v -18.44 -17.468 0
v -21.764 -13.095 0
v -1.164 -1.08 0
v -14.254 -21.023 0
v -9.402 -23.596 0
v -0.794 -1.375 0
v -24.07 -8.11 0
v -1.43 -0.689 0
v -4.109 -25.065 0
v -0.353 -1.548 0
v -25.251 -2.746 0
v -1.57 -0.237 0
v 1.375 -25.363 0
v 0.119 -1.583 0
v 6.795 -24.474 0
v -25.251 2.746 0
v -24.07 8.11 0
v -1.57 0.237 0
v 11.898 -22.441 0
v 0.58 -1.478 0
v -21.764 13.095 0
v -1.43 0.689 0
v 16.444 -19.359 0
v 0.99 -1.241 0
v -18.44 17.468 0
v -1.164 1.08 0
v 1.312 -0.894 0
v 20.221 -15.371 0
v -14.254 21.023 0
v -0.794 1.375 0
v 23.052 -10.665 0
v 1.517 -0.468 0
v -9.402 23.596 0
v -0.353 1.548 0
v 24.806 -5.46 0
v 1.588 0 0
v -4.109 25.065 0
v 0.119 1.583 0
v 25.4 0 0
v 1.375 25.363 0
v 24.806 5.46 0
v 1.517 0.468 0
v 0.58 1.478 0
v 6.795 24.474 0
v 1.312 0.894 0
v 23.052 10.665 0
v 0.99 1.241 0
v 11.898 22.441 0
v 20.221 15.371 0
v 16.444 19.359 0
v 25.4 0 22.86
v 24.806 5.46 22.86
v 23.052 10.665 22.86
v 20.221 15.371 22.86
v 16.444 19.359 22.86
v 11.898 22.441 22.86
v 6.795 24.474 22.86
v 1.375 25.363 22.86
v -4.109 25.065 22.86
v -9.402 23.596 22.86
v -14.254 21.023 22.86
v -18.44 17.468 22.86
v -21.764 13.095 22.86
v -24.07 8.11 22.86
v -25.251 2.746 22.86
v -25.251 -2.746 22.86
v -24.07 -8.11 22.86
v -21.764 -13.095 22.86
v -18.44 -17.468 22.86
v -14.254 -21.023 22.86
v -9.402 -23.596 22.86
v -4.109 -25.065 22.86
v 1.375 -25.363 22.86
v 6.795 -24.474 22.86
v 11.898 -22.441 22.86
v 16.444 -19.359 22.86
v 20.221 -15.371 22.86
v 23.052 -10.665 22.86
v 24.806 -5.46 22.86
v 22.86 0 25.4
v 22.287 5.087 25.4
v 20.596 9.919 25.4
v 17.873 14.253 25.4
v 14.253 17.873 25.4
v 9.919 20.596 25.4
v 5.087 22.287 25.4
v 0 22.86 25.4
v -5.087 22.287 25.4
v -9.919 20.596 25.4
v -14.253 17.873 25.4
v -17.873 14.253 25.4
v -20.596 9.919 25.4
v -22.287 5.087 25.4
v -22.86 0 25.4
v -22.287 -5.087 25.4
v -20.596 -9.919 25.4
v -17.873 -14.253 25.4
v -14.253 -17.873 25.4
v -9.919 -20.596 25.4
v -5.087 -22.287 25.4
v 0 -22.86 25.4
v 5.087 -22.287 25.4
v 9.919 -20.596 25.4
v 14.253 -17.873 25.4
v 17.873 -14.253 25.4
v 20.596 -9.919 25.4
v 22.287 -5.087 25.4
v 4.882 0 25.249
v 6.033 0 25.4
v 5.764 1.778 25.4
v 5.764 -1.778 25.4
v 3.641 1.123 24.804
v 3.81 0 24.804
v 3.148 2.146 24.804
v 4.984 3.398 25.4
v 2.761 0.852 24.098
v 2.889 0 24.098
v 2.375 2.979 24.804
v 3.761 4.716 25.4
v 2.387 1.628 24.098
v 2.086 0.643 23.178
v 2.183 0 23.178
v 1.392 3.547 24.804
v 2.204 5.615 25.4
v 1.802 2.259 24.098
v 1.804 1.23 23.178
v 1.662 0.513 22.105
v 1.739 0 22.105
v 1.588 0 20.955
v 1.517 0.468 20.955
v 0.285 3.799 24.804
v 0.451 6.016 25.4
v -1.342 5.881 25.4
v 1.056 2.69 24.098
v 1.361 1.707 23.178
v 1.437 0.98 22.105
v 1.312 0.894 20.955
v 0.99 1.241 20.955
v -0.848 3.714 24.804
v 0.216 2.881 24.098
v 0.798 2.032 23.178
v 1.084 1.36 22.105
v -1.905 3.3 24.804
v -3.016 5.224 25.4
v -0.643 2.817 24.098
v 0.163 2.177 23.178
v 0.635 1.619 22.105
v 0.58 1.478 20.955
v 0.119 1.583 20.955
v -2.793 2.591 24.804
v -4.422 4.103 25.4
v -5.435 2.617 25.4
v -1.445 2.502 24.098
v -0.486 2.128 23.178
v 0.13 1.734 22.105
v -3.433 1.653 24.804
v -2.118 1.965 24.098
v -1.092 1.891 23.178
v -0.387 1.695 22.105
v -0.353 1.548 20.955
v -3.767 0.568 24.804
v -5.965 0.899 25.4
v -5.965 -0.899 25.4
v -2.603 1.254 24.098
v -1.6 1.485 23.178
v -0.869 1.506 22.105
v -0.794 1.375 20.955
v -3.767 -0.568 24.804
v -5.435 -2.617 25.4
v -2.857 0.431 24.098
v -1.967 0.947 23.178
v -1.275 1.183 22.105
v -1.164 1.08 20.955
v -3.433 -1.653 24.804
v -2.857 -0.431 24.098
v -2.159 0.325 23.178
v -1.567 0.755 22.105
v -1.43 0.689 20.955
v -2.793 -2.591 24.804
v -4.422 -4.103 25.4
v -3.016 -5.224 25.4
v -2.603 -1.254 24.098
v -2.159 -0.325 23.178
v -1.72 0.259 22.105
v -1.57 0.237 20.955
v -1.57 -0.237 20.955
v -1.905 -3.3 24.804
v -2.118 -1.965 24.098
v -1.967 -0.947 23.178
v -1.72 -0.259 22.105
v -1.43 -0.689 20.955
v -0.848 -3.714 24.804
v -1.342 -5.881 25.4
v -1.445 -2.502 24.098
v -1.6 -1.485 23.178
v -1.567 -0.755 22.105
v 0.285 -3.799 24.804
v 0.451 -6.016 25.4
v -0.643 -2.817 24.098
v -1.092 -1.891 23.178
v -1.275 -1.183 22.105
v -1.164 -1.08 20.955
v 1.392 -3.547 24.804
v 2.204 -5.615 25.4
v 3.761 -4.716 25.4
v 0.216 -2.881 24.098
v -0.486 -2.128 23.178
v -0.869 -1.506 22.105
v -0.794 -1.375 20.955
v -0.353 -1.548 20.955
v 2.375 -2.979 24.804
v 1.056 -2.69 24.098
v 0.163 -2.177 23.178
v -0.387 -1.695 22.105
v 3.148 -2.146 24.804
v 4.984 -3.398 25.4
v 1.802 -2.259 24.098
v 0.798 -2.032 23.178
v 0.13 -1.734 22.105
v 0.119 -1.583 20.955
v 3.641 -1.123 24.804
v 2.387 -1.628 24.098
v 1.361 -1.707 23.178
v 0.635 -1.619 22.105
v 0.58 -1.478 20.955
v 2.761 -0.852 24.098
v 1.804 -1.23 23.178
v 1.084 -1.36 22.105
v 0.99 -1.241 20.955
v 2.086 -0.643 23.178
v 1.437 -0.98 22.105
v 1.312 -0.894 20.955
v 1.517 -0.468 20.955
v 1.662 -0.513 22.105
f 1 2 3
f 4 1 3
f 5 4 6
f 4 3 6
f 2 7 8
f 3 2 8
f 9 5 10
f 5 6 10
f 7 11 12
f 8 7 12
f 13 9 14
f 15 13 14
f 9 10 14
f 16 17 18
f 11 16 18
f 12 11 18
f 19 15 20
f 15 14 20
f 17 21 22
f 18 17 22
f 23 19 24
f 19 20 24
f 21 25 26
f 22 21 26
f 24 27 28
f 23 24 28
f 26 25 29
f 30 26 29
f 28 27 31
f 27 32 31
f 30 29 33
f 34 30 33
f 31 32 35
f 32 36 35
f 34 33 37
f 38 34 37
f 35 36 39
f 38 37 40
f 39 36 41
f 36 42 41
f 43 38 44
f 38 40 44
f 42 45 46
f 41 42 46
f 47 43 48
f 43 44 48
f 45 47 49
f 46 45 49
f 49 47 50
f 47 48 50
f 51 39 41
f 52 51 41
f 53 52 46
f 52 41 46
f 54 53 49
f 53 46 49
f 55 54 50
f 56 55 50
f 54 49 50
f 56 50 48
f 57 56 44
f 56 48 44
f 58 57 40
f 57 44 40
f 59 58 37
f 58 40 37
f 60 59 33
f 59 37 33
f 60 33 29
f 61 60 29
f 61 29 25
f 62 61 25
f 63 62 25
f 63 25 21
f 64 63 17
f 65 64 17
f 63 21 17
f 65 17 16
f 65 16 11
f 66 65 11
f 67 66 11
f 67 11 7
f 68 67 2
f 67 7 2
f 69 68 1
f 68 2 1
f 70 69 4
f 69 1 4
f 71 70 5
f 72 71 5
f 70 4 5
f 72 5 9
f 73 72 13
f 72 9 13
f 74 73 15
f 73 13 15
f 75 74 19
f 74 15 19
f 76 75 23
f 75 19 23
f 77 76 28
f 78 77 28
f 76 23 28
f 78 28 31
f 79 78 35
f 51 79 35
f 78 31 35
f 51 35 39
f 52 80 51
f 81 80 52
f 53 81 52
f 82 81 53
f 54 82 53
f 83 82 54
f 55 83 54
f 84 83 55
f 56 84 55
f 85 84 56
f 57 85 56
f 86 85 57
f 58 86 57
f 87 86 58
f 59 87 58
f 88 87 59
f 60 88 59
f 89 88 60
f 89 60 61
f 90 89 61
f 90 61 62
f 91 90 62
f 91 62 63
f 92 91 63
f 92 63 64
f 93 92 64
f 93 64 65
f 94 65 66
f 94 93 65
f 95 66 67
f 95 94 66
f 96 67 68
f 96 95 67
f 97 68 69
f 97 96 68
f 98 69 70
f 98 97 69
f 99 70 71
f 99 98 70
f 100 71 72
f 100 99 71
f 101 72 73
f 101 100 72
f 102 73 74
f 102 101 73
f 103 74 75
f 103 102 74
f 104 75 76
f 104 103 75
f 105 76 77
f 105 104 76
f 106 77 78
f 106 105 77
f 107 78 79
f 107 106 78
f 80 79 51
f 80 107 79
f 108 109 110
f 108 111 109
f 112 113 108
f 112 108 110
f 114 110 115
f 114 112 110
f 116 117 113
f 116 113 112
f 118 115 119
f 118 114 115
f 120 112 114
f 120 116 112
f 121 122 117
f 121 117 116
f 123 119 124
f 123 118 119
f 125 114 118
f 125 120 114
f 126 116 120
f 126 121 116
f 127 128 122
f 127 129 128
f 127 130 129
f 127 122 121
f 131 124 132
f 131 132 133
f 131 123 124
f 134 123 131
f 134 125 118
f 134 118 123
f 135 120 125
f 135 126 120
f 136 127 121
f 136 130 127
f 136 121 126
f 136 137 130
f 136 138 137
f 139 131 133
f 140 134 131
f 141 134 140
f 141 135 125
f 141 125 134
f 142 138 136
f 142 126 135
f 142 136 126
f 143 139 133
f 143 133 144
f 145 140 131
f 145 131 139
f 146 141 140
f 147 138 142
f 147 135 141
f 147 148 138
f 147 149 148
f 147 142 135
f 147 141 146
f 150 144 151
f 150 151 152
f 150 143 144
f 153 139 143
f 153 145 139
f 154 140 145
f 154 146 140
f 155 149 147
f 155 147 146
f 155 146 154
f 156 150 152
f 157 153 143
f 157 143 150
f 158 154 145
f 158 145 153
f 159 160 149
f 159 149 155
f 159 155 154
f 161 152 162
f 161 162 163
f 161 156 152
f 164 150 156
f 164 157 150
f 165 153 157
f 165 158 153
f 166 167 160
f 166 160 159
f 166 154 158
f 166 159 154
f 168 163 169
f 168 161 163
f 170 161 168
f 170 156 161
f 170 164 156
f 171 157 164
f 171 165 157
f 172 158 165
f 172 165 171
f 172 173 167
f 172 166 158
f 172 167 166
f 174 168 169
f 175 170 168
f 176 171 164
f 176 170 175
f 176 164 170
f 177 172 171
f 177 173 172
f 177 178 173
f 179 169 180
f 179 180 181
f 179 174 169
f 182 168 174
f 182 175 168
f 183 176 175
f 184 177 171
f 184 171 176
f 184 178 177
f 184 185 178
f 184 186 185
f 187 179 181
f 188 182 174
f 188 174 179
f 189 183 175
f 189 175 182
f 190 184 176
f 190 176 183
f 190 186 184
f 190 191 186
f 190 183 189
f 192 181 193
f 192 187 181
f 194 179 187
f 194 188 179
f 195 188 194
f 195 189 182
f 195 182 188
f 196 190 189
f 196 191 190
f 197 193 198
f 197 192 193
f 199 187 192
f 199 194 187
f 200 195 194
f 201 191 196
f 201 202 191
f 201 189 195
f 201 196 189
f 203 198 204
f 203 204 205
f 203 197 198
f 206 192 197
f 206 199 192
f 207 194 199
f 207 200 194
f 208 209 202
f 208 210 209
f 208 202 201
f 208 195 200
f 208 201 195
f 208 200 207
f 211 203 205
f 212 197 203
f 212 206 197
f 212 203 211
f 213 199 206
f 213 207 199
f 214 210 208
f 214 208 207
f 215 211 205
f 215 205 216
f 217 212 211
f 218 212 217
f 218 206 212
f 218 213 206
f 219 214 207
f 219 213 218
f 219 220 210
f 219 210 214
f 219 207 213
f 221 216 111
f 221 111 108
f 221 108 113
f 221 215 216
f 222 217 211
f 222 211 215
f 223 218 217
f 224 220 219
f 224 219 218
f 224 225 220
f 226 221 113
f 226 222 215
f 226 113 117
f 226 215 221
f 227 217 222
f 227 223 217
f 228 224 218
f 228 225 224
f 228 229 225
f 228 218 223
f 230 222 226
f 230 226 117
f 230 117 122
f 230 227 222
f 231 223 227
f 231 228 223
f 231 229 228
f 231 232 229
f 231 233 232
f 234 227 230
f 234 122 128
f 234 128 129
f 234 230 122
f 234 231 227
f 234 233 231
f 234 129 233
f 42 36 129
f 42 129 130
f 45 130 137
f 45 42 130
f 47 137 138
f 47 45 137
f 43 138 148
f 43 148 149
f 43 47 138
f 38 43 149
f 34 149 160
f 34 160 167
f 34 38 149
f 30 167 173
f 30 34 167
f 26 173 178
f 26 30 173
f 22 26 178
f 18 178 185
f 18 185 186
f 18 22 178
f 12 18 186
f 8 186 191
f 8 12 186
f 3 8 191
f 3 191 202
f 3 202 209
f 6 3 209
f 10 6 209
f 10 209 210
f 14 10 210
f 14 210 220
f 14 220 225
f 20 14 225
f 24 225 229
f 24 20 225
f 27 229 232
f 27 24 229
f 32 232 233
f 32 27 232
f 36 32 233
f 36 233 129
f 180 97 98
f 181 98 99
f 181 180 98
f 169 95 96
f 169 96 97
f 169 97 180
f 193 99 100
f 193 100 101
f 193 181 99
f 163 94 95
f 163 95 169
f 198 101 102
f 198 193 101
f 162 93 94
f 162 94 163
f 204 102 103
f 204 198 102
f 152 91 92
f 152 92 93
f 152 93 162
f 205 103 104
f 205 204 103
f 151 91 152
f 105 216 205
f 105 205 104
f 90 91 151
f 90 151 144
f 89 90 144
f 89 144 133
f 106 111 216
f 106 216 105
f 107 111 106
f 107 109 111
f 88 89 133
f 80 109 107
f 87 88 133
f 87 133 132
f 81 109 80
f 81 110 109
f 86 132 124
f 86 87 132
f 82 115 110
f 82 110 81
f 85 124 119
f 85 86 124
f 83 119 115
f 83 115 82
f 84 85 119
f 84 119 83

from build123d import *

# Parameters (mm, degrees)
F0_R     = 25.4
F0_R_2   = 1.5875
F1_DEPTH = 25.4
F2_SIZE  = 2.54
F3_R     = 4.445


with BuildPart() as f1:
    # F0 (on Top) → F1 (new body)
    with BuildSketch(Plane.XY):
        Circle(F0_R)
        Circle(F0_R_2, mode=Mode.SUBTRACT)
    extrude(amount=F1_DEPTH)

    # F2
    f2_edges = [f1.edges().sort_by_distance(p)[0] for p in [
        (-25.4, 0, 25.4),
    ]]
    chamfer(f2_edges, length=F2_SIZE)

    # F3
    f3_edges = [f1.edges().sort_by_distance(p)[0] for p in [
        (-1.5875, 0, 25.4),
    ]]
    fillet(f3_edges, radius=F3_R)


solid = f1.part
